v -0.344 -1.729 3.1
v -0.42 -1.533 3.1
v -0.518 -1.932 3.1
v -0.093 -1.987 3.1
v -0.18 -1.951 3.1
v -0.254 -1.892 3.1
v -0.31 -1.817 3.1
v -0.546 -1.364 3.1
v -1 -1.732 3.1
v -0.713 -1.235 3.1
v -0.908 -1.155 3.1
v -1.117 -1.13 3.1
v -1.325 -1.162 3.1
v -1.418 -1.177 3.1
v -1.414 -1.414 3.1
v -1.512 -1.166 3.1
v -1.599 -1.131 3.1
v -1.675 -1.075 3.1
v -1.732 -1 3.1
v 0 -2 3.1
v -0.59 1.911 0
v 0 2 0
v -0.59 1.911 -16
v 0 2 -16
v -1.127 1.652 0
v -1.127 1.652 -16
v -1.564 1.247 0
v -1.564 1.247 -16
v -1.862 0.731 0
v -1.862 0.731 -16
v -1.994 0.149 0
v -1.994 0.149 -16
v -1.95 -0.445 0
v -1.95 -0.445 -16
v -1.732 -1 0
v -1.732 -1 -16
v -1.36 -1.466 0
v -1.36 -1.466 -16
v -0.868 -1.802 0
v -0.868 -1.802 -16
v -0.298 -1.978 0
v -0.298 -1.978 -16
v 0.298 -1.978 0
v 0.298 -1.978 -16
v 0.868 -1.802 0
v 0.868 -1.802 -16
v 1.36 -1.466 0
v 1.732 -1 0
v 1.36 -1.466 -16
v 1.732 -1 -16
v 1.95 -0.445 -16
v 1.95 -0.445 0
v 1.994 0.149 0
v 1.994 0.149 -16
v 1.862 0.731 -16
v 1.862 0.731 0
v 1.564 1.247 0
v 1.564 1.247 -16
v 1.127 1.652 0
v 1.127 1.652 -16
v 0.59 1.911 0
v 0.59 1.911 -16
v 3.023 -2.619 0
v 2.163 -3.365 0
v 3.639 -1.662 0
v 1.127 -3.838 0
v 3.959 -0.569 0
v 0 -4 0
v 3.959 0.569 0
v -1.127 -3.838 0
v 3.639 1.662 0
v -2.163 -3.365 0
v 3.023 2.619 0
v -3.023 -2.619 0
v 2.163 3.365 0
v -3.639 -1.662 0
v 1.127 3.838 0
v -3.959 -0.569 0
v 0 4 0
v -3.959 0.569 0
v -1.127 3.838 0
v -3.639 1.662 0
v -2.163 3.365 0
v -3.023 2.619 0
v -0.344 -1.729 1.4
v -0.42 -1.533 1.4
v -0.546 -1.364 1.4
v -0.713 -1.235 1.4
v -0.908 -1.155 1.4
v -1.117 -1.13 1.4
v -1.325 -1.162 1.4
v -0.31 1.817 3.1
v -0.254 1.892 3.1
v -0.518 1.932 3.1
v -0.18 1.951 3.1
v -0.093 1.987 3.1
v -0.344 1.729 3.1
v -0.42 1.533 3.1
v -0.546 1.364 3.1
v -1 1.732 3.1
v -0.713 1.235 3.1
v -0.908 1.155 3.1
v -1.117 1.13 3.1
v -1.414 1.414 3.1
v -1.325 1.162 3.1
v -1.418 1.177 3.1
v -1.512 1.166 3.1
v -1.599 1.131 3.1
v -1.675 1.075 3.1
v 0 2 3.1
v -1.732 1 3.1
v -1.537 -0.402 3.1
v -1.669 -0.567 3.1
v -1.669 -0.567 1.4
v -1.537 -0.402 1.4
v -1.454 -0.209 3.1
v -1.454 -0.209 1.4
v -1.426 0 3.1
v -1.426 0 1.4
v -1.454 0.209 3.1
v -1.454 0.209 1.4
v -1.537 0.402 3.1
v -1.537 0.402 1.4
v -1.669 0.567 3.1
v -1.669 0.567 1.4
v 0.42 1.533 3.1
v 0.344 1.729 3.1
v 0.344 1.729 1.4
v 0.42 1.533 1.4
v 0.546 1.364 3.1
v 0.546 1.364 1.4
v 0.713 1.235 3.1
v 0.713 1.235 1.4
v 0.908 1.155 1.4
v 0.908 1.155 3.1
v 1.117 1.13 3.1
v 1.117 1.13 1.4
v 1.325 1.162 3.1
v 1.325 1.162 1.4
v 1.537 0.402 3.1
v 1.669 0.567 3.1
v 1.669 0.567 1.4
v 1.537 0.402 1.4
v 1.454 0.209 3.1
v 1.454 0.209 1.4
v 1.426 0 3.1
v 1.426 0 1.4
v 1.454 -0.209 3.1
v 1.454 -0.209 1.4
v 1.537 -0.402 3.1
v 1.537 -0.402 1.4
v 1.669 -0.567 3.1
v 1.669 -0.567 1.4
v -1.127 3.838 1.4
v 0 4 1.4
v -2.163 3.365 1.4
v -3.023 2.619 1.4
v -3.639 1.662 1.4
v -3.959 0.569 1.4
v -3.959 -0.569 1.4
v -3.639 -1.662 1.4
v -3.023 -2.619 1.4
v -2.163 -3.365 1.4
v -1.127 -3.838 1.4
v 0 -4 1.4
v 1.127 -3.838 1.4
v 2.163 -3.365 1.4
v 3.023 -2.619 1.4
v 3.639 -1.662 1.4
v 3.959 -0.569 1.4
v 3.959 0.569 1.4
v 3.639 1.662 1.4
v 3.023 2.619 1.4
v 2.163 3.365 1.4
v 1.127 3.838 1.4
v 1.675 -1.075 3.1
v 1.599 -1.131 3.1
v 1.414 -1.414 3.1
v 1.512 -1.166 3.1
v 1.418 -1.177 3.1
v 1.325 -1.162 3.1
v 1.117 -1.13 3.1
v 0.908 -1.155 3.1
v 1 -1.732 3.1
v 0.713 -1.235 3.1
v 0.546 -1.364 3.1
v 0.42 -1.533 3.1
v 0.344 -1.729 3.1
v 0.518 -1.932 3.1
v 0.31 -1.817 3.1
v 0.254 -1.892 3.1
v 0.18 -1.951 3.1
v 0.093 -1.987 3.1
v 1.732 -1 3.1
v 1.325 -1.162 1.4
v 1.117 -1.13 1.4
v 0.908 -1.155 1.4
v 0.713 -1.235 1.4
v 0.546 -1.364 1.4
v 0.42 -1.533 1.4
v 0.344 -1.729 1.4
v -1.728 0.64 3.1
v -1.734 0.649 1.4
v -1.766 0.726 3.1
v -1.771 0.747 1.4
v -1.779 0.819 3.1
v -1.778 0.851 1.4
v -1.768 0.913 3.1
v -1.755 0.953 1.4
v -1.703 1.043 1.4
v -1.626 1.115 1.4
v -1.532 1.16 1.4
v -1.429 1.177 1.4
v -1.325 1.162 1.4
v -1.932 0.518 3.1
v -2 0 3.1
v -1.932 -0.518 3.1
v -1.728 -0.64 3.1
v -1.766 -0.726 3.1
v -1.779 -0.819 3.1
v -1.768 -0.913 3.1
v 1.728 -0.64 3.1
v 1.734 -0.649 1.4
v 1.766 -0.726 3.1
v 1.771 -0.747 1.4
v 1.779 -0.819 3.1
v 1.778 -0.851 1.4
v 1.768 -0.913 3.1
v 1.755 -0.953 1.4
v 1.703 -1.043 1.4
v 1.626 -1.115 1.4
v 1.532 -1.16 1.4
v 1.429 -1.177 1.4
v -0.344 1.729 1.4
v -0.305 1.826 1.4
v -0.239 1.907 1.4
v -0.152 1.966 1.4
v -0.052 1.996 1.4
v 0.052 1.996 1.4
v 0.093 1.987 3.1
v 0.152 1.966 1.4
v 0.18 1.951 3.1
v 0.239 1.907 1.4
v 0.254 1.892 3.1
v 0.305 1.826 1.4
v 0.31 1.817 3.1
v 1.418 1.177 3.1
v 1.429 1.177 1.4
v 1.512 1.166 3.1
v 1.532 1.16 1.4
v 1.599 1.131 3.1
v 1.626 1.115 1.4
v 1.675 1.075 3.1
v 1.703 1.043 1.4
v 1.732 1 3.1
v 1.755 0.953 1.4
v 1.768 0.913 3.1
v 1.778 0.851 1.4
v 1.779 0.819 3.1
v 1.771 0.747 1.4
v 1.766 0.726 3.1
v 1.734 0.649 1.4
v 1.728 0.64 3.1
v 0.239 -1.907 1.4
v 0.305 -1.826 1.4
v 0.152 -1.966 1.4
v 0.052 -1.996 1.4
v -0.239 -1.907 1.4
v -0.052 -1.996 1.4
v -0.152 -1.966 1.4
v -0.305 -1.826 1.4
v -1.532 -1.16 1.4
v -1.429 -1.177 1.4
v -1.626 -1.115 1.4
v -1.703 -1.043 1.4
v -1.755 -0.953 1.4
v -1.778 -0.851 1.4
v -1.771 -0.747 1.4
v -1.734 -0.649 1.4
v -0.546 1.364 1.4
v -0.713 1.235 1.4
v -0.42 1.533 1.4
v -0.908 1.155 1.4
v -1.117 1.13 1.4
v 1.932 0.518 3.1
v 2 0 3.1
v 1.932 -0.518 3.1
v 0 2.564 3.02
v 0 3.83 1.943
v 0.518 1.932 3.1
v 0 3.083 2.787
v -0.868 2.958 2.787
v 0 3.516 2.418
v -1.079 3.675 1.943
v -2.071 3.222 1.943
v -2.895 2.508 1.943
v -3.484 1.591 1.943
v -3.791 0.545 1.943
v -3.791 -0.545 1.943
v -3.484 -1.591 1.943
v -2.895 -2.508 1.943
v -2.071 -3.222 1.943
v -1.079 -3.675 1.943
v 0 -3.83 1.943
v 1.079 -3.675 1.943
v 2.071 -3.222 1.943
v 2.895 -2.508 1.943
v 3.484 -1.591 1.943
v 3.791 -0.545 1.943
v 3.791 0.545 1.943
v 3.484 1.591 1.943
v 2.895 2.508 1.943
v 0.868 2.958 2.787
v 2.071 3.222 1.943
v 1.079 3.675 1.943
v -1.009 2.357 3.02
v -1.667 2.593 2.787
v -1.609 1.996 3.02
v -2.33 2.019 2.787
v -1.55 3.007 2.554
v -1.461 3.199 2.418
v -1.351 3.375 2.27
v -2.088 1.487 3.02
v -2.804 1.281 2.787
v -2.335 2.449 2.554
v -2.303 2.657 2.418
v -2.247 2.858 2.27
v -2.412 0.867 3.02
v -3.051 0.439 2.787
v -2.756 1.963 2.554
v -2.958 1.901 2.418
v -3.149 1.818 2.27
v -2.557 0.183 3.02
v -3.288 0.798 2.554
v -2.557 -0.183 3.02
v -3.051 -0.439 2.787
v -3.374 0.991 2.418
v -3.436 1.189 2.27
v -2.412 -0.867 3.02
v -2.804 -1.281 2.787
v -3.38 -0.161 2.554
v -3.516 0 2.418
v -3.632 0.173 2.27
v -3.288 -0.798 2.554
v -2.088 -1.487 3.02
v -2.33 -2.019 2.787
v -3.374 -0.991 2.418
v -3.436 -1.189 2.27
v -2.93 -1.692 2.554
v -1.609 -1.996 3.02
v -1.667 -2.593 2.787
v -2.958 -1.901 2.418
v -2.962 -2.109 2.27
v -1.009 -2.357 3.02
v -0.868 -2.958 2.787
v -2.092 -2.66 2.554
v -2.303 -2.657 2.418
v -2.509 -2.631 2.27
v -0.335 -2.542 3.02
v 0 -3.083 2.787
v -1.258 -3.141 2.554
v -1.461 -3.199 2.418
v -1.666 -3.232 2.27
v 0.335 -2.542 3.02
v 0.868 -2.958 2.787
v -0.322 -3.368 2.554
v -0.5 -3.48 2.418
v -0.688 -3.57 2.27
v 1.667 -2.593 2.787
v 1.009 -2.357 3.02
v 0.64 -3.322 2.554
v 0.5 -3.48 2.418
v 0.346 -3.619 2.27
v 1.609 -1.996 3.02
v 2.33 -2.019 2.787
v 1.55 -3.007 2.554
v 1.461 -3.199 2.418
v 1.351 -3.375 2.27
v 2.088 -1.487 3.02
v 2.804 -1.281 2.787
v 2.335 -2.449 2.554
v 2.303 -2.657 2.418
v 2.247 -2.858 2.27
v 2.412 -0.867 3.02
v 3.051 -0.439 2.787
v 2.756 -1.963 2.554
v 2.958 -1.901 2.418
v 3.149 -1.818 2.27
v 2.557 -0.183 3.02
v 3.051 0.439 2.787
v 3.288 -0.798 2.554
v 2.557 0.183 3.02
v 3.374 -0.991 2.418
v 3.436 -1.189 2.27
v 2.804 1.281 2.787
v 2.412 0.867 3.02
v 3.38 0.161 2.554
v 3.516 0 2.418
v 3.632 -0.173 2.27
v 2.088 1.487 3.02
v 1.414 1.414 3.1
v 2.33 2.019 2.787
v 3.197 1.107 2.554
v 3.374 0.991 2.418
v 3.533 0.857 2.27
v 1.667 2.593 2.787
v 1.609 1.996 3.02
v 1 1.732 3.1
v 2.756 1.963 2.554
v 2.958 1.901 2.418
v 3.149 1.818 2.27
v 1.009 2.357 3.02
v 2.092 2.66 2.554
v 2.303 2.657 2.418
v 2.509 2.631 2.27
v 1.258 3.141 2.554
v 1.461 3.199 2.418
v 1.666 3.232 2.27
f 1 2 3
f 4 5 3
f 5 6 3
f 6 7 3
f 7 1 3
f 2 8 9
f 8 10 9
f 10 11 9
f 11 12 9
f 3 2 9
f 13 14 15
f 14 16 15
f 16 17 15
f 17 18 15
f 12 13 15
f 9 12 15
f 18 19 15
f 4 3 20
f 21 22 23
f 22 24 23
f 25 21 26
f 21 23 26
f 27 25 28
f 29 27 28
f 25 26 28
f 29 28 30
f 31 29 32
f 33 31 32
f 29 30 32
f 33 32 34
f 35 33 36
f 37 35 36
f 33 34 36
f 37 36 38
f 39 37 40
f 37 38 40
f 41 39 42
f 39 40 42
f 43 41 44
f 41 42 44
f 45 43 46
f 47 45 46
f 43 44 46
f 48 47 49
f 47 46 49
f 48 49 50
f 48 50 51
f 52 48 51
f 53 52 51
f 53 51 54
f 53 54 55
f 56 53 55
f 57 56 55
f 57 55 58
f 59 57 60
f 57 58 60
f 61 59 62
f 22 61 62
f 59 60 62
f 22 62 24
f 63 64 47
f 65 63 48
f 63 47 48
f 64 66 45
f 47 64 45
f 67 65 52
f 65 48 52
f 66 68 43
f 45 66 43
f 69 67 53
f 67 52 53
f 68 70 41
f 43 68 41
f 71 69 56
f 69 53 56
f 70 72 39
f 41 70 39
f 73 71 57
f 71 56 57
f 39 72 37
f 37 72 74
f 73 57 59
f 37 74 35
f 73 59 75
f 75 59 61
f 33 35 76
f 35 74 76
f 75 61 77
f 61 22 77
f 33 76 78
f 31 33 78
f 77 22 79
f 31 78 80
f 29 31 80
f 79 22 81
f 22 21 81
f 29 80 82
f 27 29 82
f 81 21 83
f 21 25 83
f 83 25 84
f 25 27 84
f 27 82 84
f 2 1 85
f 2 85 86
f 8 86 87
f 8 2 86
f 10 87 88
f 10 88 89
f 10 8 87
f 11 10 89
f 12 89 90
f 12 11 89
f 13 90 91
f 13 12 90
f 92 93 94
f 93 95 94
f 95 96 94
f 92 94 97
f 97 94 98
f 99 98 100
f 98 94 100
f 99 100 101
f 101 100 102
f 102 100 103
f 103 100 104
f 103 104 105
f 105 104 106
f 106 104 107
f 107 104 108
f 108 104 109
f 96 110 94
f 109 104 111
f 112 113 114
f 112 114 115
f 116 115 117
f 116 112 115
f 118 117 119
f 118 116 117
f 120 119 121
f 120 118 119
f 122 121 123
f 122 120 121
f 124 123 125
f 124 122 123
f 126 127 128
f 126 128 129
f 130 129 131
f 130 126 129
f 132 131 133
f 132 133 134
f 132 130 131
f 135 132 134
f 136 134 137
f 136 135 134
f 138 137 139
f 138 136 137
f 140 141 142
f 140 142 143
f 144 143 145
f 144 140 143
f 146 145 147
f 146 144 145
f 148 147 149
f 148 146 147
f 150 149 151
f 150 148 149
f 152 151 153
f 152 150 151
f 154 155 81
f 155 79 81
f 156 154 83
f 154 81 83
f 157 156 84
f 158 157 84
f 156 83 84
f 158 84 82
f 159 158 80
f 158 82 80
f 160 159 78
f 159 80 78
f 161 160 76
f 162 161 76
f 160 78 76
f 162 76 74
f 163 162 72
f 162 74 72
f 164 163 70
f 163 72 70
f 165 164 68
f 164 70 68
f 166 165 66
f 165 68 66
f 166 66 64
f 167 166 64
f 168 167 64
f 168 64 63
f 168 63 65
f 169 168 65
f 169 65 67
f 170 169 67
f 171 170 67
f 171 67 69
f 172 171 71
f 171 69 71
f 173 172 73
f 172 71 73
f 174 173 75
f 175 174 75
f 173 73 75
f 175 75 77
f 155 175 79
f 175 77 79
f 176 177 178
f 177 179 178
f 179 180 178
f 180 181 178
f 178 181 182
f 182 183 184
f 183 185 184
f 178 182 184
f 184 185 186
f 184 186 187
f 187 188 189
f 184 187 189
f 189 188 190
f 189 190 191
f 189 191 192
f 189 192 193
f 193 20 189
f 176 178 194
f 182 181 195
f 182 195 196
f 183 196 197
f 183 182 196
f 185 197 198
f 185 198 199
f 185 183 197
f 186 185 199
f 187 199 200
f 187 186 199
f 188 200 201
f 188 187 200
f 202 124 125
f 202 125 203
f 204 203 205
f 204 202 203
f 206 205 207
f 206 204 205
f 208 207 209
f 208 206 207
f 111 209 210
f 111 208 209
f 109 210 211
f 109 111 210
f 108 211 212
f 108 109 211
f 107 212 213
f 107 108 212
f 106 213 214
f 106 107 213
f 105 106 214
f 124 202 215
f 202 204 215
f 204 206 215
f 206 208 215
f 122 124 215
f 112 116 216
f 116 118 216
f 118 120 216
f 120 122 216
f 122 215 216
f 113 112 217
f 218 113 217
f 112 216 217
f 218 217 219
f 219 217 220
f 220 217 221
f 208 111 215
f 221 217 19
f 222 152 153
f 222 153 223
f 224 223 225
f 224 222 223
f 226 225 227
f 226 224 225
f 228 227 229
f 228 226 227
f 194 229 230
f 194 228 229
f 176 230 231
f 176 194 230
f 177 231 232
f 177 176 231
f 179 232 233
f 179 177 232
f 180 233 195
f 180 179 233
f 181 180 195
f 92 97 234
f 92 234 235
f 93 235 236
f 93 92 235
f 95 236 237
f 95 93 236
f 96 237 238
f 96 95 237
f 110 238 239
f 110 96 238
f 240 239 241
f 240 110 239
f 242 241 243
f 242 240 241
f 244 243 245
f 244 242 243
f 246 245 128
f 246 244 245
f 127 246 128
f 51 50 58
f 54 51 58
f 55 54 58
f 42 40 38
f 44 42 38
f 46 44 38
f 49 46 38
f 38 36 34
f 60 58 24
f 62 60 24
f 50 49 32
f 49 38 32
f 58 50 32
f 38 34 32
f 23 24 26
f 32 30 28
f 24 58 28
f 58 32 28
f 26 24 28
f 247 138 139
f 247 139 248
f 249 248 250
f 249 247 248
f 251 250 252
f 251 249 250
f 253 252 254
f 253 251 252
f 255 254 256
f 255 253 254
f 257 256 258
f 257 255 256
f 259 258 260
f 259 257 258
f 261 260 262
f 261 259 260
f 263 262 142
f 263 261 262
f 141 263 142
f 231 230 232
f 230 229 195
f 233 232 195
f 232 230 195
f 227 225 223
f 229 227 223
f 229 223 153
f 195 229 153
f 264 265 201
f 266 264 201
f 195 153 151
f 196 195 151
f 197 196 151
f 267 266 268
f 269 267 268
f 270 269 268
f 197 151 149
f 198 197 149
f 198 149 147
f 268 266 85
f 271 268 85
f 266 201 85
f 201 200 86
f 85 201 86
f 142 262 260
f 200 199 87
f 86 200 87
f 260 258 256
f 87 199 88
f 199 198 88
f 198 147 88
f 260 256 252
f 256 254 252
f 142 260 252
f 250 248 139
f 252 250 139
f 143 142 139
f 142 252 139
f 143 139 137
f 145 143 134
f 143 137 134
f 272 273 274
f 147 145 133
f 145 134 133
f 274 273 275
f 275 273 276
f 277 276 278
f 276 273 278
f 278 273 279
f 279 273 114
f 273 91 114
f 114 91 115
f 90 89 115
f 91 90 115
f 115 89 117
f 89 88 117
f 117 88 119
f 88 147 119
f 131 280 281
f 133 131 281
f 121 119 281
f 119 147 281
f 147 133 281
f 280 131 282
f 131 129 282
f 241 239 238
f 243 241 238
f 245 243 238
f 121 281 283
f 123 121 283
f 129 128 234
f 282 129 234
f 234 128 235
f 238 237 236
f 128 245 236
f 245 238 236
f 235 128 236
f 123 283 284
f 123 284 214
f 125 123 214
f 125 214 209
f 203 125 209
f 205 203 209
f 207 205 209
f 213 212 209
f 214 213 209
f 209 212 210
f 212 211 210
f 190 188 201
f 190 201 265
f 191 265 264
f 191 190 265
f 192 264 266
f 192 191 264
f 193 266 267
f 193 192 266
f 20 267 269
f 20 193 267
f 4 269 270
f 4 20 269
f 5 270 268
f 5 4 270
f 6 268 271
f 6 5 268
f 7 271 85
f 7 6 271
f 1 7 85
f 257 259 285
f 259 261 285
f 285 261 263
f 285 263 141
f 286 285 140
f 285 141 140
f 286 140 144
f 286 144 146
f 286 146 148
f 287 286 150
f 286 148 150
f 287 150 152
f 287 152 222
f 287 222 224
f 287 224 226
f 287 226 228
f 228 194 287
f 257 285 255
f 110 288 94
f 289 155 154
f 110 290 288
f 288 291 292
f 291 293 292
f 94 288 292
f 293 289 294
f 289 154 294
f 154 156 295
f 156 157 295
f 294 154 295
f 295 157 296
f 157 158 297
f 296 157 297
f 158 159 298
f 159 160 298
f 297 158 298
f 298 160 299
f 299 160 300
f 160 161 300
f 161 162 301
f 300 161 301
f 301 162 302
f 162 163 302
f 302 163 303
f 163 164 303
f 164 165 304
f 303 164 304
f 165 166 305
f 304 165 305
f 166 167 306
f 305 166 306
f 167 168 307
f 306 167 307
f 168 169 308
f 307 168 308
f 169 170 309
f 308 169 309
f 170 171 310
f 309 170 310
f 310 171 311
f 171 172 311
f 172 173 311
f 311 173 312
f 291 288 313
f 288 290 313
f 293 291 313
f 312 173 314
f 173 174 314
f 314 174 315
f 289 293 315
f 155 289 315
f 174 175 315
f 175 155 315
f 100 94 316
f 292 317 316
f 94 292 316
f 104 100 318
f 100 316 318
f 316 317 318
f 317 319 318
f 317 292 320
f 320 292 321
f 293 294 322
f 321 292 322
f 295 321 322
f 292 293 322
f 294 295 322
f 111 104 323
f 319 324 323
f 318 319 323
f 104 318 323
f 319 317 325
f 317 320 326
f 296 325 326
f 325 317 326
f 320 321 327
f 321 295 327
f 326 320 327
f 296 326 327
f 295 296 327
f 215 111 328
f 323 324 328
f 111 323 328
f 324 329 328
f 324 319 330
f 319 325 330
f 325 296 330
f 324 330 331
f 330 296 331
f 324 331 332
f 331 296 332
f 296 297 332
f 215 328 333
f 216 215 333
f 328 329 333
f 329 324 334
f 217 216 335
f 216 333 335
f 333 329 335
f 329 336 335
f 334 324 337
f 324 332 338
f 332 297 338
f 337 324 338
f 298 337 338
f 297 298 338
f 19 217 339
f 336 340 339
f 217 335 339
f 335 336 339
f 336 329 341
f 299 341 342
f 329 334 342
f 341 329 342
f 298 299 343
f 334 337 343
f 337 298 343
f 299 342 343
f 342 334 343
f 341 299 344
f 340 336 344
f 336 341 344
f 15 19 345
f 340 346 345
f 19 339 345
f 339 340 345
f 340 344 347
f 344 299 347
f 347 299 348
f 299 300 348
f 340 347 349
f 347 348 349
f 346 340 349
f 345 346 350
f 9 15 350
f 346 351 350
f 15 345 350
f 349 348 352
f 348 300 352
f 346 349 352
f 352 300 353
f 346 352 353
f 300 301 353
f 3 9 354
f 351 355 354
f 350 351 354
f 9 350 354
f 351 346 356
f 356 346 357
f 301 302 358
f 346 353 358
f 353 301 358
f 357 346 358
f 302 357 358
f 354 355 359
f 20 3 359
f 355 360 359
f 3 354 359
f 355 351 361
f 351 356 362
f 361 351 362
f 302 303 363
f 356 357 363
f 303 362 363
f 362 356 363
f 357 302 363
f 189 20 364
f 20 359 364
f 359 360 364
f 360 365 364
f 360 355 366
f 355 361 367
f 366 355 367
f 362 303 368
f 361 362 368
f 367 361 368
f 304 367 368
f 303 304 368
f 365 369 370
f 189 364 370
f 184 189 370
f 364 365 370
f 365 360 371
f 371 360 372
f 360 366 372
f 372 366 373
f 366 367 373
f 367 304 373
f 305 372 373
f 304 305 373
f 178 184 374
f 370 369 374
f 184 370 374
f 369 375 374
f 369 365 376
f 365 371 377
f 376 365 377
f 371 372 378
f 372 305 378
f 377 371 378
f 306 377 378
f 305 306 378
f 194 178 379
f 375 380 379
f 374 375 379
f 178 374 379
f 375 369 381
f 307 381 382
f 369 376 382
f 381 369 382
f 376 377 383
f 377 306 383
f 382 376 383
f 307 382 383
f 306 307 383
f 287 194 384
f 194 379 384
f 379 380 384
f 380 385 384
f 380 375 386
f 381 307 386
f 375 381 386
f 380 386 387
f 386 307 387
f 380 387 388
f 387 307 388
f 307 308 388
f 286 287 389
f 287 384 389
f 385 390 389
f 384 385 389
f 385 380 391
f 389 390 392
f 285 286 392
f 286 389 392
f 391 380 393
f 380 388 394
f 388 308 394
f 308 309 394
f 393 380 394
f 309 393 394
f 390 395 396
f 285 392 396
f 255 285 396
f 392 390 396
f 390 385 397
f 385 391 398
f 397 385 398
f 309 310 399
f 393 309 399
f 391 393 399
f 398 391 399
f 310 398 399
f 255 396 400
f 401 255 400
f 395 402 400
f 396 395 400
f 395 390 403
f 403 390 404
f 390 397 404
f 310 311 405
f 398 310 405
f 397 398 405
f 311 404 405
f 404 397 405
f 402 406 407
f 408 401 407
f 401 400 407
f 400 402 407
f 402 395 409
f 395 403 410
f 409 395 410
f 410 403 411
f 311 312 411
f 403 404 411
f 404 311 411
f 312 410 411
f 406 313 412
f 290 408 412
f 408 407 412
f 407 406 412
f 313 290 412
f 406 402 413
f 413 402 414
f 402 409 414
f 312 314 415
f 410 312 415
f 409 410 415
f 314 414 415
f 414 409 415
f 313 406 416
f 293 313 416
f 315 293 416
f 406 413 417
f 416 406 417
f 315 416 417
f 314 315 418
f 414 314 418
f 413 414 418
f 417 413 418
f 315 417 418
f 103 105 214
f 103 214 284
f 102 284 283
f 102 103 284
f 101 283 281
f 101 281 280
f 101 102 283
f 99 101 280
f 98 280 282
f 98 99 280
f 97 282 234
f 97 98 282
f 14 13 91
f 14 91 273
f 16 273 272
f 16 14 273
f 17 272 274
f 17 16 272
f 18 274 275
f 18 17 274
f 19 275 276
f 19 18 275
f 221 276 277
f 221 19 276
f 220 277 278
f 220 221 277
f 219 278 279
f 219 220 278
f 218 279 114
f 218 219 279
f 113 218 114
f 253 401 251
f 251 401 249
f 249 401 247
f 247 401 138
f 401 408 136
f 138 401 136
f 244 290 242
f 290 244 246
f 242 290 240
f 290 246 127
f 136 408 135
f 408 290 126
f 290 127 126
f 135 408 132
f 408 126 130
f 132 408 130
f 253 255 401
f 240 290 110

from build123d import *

# Parameters (mm, degrees)
ENL_V_MAT_EXTRU_1_DEPTH = 1.7


with BuildPart() as part:
    # Esquisse1 → Révolution1 (revolve)
    with BuildSketch(Plane(origin=(0, 0, 0), x_dir=(0, 0, -1), z_dir=(1, 0, 0))):
        with BuildLine():
            Line((-3.1, 0), (-3.1, 2))
            ThreePointArc((-3.1, 2), (-2.617577029, 3.312440475), (-1.4, 4))
            Line((-1.4, 4), (0, 4))
            Line((0, 4), (0, 2))
            Line((0, 2), (16, 2))
            Line((16, 2), (16, 0))
            Line((16, 0), (-3.1, 0))
        make_face()
    revolve(axis=Axis((0, 0, 3.1), (0, 0, 1)))

    # Esquisse2 → Enlèv. mat.-Extru.1 (cut)
    with BuildSketch(Plane.XY.offset(3.1)):
        with BuildLine():
            ThreePointArc((-0.343897346, 1.728888708), (0, 2), (0.343897346, 1.728888708))
            ThreePointArc((0.343897346, 1.728888708), (0.712882715, 1.234749083), (1.325312868, 1.162268192))
            ThreePointArc((1.325312868, 1.162268192), (1.732050808, 1), (1.669210214, 0.566620516))
            ThreePointArc((1.669210214, 0.566620516), (1.42576543, 0), (1.669210214, -0.566620516))
            ThreePointArc((1.669210214, -0.566620516), (1.732050808, -1), (1.325312868, -1.162268192))
            ThreePointArc((1.325312868, -1.162268192), (0.712882715, -1.234749083), (0.343897346, -1.728888708))
            ThreePointArc((0.343897346, -1.728888708), (0, -2), (-0.343897346, -1.728888708))
            ThreePointArc((-0.343897346, -1.728888708), (-0.712882715, -1.234749083), (-1.325312868, -1.162268192))
            ThreePointArc((-1.325312868, -1.162268192), (-1.732050808, -1), (-1.669210214, -0.566620516))
            ThreePointArc((-1.669210214, -0.566620516), (-1.42576543, 0), (-1.669210214, 0.566620516))
            ThreePointArc((-1.669210214, 0.566620516), (-1.732050808, 1), (-1.325312868, 1.162268192))
            ThreePointArc((-1.325312868, 1.162268192), (-0.712882715, 1.234749083), (-0.343897346, 1.728888708))
        make_face()
    extrude(amount=-ENL_V_MAT_EXTRU_1_DEPTH, mode=Mode.SUBTRACT)


solid = part.part
